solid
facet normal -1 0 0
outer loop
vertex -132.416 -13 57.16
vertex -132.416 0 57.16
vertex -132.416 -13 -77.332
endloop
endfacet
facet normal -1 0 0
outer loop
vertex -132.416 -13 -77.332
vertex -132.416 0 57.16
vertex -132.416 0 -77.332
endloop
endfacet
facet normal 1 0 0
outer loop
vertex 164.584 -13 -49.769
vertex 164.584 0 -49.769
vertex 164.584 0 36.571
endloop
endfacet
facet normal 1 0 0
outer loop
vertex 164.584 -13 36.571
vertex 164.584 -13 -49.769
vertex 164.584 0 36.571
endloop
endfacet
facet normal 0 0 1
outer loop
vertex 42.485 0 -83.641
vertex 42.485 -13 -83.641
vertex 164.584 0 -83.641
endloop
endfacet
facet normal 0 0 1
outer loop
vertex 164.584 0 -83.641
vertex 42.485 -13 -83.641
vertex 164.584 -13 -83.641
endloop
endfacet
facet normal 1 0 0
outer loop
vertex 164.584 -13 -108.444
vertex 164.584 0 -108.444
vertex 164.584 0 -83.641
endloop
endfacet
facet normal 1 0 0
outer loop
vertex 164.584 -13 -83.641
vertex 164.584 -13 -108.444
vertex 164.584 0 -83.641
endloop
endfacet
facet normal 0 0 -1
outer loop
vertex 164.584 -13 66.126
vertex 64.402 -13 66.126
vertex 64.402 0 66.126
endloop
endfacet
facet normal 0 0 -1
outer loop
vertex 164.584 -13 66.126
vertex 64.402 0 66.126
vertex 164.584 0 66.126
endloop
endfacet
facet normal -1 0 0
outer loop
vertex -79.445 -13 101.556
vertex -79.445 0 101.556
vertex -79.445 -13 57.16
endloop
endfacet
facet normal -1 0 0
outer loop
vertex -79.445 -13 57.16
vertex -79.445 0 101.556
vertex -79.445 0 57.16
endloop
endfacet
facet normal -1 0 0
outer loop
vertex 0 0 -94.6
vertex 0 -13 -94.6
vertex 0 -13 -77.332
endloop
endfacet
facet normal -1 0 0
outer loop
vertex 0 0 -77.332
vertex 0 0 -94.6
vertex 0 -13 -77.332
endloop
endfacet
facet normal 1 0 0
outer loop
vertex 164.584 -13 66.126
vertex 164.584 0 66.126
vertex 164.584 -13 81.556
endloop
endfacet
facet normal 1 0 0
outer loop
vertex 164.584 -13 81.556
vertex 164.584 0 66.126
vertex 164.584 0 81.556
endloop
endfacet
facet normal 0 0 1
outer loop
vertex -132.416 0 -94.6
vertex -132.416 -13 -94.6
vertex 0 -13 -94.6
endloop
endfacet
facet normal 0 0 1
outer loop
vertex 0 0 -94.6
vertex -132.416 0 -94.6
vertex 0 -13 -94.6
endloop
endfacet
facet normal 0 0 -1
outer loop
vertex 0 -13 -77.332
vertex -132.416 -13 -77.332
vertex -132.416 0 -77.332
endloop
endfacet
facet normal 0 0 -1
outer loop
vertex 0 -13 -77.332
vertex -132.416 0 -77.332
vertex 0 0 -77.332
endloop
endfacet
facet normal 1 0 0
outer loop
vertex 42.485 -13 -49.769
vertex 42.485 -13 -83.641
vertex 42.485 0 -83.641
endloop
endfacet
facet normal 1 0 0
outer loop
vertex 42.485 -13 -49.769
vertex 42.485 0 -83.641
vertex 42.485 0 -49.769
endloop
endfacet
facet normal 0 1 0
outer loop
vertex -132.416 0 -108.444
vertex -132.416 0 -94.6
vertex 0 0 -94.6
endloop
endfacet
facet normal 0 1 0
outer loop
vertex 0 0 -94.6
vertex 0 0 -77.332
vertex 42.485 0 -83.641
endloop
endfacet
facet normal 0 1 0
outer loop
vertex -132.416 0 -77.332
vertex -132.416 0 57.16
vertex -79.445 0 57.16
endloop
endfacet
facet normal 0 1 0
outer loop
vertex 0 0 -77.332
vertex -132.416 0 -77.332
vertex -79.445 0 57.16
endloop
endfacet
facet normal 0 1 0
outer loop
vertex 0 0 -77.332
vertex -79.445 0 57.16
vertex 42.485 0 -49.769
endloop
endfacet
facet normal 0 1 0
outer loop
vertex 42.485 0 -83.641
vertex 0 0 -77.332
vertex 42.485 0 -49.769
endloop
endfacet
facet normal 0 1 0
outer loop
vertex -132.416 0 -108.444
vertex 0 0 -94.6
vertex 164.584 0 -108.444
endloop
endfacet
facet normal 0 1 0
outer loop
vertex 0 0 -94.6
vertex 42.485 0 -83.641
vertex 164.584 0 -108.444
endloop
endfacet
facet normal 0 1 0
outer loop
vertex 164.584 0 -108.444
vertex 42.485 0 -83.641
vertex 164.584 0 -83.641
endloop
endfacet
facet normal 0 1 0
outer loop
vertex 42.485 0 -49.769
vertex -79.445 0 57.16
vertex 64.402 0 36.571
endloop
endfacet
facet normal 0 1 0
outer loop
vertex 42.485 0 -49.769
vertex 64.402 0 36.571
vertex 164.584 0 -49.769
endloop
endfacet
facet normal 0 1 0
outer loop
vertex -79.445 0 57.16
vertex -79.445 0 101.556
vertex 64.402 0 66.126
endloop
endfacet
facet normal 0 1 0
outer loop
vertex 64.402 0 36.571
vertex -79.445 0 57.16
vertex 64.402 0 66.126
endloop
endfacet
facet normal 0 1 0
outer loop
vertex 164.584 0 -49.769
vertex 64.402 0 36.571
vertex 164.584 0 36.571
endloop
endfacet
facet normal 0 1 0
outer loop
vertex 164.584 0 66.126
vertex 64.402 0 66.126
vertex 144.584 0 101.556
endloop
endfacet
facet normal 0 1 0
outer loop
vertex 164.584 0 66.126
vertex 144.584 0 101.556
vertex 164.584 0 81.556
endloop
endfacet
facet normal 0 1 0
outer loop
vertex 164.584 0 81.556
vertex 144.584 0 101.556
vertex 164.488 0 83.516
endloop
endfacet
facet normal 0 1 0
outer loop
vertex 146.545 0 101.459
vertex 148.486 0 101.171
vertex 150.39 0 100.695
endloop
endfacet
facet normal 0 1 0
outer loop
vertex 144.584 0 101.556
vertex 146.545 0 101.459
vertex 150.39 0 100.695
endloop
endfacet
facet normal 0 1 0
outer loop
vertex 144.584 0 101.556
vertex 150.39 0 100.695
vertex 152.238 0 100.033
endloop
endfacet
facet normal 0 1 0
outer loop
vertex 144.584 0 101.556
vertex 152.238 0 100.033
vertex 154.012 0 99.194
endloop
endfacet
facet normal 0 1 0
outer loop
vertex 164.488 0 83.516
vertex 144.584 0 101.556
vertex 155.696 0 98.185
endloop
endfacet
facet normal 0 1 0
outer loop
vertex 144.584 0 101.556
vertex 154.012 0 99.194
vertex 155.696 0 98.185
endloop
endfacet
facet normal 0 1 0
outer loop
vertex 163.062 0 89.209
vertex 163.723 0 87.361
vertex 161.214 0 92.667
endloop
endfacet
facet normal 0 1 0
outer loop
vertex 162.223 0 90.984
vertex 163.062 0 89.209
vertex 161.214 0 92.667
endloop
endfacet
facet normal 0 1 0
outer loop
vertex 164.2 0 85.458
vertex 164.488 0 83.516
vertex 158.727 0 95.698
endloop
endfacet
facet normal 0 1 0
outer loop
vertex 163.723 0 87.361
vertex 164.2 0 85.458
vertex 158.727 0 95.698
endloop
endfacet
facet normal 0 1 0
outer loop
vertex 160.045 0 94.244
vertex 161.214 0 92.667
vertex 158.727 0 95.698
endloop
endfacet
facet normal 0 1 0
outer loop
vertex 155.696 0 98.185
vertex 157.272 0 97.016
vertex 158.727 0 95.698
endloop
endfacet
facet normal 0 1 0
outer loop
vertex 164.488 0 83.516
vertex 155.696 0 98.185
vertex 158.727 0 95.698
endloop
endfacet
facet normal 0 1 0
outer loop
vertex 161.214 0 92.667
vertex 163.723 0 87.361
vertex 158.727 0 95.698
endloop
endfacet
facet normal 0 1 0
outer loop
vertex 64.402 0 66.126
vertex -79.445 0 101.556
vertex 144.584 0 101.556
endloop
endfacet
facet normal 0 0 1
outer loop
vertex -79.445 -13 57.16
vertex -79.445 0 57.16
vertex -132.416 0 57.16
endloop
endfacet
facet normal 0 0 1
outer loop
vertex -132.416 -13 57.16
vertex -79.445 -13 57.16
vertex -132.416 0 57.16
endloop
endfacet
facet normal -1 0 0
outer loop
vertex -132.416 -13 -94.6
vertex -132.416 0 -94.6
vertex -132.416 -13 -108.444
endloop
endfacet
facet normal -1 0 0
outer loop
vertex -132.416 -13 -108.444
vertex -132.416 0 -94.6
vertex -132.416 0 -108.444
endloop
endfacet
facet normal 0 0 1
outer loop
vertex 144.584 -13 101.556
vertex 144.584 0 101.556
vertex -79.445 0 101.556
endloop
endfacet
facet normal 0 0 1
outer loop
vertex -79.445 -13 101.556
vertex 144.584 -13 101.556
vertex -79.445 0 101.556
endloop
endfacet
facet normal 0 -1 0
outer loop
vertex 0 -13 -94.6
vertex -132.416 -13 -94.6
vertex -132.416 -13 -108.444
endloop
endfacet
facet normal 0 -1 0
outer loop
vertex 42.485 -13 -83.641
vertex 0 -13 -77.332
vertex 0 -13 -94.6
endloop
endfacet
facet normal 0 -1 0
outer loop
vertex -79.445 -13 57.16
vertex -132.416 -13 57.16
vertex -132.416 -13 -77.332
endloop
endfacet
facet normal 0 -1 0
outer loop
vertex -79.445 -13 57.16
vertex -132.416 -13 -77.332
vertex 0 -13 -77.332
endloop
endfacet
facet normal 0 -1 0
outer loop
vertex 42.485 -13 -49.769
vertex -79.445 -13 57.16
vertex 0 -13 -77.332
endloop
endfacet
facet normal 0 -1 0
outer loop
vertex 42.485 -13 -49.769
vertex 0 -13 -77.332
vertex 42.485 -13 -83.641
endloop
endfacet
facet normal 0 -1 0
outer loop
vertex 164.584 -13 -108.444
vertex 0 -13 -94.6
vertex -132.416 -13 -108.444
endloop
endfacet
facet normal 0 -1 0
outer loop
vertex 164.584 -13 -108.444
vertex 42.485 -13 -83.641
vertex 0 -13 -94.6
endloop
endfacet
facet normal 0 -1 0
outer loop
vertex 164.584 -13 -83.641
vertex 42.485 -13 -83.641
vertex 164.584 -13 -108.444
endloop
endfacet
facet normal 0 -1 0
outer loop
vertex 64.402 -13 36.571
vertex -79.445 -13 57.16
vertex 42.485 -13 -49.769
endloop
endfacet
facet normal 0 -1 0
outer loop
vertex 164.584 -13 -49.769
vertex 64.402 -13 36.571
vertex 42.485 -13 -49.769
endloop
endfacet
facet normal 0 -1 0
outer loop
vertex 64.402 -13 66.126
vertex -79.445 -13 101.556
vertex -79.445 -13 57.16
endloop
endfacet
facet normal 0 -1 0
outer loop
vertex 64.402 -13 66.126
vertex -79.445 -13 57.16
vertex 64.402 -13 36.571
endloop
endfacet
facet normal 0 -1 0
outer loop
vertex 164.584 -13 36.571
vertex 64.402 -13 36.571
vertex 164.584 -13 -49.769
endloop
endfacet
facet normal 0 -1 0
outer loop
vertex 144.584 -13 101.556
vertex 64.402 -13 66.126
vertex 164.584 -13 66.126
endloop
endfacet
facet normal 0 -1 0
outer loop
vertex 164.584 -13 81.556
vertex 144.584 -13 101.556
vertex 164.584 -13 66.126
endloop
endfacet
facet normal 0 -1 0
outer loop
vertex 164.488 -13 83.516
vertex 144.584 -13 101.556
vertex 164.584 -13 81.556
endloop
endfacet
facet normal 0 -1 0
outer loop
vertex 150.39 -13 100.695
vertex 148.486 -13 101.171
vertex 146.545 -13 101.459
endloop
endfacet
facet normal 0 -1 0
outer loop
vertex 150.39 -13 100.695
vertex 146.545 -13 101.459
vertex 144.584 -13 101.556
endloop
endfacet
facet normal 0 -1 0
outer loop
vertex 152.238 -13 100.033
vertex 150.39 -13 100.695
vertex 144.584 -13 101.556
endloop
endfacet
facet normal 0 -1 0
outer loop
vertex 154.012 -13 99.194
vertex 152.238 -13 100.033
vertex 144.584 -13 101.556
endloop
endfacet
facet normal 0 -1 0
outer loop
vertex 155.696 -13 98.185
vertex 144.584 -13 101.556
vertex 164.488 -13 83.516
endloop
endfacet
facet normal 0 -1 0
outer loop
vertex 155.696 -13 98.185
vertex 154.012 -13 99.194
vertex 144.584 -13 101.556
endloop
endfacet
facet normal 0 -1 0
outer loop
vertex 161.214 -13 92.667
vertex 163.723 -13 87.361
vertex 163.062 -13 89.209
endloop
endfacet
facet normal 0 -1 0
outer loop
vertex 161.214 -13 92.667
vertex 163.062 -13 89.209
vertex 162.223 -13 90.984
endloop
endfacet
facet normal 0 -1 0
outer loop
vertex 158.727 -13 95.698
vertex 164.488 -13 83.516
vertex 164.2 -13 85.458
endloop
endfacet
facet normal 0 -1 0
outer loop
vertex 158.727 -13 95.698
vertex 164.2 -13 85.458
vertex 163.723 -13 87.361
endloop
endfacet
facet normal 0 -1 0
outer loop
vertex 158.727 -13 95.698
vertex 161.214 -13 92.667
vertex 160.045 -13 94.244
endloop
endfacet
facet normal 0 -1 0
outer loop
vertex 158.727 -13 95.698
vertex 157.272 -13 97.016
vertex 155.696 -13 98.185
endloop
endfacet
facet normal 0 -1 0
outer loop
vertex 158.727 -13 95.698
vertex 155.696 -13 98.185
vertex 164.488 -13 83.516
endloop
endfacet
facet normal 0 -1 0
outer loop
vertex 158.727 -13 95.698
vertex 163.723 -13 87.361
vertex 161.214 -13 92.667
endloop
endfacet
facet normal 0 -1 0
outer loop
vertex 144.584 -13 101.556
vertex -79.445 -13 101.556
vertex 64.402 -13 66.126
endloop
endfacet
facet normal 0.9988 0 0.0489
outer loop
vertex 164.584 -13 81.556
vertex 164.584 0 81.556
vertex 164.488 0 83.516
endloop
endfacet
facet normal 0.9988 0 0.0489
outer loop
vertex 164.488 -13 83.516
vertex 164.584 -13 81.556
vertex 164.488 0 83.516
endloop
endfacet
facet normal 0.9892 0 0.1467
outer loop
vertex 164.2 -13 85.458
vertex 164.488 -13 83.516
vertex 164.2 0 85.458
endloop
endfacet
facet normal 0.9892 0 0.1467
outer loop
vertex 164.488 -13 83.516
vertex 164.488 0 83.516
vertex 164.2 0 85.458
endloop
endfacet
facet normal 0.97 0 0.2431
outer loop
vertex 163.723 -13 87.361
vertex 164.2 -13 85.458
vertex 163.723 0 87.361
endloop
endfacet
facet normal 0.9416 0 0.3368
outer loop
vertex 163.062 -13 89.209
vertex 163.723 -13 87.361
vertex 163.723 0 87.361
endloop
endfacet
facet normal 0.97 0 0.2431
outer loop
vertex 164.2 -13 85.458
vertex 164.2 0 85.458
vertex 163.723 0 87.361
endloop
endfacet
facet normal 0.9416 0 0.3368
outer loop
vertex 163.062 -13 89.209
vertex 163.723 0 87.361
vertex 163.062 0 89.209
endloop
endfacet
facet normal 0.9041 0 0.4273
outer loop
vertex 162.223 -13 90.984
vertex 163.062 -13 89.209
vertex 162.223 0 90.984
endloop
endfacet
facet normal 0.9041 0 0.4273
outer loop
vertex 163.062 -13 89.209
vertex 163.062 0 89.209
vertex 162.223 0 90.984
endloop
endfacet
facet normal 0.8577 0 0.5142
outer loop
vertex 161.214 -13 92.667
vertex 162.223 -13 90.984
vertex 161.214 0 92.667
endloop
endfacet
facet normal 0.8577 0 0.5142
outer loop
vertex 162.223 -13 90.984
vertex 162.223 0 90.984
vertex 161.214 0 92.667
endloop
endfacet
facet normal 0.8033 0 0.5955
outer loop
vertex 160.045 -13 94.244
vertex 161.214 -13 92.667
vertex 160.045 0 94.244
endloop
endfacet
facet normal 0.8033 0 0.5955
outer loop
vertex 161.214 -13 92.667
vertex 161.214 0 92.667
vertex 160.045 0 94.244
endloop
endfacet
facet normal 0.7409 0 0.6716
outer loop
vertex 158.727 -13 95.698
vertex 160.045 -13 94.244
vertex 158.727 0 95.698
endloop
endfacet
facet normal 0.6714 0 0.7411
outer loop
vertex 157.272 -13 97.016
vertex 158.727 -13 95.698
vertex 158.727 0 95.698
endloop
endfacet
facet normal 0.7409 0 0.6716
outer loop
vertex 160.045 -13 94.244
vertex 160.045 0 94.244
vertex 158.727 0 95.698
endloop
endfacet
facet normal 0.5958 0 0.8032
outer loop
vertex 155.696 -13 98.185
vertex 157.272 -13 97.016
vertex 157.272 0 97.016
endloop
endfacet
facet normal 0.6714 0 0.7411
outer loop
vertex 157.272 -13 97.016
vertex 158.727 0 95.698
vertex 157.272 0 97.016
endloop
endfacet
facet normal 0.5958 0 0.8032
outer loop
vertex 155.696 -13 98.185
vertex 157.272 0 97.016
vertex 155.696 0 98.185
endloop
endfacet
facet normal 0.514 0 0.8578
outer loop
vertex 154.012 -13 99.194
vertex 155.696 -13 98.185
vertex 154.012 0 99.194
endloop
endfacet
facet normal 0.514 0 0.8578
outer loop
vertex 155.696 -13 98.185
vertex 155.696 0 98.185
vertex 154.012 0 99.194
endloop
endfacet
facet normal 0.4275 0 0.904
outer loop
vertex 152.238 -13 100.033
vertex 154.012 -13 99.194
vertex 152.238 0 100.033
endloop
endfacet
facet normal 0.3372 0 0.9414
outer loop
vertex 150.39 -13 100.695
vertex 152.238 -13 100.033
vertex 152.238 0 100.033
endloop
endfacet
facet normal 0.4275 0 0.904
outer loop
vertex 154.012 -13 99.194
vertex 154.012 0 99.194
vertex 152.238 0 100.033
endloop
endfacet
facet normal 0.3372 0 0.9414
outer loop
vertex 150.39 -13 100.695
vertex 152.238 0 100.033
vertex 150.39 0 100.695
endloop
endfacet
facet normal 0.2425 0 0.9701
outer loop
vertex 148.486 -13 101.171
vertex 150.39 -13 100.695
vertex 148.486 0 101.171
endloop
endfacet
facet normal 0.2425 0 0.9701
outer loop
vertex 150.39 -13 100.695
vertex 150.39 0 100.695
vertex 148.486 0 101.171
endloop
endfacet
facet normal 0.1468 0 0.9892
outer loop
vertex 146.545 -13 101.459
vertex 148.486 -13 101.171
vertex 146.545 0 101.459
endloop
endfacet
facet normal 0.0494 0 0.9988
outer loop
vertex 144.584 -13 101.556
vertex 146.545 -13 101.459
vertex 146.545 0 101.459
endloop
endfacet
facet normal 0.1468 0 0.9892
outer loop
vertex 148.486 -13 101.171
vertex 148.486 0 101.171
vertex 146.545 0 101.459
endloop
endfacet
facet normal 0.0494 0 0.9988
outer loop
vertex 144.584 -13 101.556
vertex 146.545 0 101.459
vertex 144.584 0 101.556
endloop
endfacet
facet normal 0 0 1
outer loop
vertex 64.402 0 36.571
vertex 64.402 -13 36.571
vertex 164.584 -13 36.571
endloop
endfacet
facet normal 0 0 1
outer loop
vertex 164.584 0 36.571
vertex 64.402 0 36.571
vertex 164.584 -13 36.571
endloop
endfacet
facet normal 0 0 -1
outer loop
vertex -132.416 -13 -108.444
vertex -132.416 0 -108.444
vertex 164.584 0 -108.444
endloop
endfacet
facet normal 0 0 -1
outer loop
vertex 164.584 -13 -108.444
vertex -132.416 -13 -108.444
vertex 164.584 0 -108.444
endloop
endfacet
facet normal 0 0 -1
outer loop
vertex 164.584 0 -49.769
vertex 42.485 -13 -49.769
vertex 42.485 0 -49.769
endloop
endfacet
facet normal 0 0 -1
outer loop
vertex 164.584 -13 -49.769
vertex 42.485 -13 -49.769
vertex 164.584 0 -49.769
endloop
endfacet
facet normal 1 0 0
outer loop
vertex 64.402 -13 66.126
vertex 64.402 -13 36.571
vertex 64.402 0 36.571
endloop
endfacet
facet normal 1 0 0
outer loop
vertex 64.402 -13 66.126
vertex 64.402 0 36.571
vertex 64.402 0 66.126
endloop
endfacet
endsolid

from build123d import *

# Parameters (mm, degrees)
F1_DEPTH = 13
F2_W     = 132.4155251533
F2_H     = 17.2680690885
F3_DEPTH = 13
F4_W     = 100.1826098412
F4_H     = 29.5549705625
F5_DEPTH = 13
F6_W     = 122.0997741669
F6_H     = 33.8719934225
F7_DEPTH = 13


# Not quite as in the source:
# - the program builds the solid bodies; features that only make, move or delete a surface that nothing else refers to are left out


with BuildPart() as f1:
    # F0 (on Front) → F1 (new body)
    with BuildSketch(Plane.XZ):
        with BuildLine():
            Line((144.5844748467, 101.5557457248), (-79.4445127249, 101.5557457248))
            Line((-79.4445127249, 101.5557457248), (-79.4445127249, 57.1600347757))
            Line((-79.4445127249, 57.1600347757), (-132.4155251533, 57.1600347757))
            Line((-132.4155251533, 57.1600347757), (-132.4155251533, -108.4442542752))
            Line((-132.4155251533, -108.4442542752), (164.5844748467, -108.4442542752))
            Line((164.5844748467, -108.4442542752), (164.5844748467, 81.5557457248))
            ThreePointArc((164.5844748467, 81.5557457248), (158.7266104705, 95.6978813486), (144.5844748467, 101.5557457248))
        make_face()
    extrude(amount=F1_DEPTH)

    # F2 (on face) → F3 (cut)
    with BuildSketch(Plane.XZ.offset(13)):
        with Locations((-66.2077625766, -85.9657116234)):
            Rectangle(F2_W, F2_H)
    extrude(amount=-F3_DEPTH, mode=Mode.SUBTRACT)

    # F4 (on face) → F5 (cut)
    with BuildSketch(Plane.XZ.offset(13)):
        with Locations((114.4931699261, 51.3486675918)):
            Rectangle(F4_W, F4_H)
    extrude(amount=-F5_DEPTH, mode=Mode.SUBTRACT)

    # F6 (on face) → F7 (cut)
    with BuildSketch(Plane.XZ.offset(13)):
        with Locations((103.5345877632, -66.7051747441)):
            Rectangle(F6_W, F6_H)
    extrude(amount=-F7_DEPTH, mode=Mode.SUBTRACT)


solid = f1.part
